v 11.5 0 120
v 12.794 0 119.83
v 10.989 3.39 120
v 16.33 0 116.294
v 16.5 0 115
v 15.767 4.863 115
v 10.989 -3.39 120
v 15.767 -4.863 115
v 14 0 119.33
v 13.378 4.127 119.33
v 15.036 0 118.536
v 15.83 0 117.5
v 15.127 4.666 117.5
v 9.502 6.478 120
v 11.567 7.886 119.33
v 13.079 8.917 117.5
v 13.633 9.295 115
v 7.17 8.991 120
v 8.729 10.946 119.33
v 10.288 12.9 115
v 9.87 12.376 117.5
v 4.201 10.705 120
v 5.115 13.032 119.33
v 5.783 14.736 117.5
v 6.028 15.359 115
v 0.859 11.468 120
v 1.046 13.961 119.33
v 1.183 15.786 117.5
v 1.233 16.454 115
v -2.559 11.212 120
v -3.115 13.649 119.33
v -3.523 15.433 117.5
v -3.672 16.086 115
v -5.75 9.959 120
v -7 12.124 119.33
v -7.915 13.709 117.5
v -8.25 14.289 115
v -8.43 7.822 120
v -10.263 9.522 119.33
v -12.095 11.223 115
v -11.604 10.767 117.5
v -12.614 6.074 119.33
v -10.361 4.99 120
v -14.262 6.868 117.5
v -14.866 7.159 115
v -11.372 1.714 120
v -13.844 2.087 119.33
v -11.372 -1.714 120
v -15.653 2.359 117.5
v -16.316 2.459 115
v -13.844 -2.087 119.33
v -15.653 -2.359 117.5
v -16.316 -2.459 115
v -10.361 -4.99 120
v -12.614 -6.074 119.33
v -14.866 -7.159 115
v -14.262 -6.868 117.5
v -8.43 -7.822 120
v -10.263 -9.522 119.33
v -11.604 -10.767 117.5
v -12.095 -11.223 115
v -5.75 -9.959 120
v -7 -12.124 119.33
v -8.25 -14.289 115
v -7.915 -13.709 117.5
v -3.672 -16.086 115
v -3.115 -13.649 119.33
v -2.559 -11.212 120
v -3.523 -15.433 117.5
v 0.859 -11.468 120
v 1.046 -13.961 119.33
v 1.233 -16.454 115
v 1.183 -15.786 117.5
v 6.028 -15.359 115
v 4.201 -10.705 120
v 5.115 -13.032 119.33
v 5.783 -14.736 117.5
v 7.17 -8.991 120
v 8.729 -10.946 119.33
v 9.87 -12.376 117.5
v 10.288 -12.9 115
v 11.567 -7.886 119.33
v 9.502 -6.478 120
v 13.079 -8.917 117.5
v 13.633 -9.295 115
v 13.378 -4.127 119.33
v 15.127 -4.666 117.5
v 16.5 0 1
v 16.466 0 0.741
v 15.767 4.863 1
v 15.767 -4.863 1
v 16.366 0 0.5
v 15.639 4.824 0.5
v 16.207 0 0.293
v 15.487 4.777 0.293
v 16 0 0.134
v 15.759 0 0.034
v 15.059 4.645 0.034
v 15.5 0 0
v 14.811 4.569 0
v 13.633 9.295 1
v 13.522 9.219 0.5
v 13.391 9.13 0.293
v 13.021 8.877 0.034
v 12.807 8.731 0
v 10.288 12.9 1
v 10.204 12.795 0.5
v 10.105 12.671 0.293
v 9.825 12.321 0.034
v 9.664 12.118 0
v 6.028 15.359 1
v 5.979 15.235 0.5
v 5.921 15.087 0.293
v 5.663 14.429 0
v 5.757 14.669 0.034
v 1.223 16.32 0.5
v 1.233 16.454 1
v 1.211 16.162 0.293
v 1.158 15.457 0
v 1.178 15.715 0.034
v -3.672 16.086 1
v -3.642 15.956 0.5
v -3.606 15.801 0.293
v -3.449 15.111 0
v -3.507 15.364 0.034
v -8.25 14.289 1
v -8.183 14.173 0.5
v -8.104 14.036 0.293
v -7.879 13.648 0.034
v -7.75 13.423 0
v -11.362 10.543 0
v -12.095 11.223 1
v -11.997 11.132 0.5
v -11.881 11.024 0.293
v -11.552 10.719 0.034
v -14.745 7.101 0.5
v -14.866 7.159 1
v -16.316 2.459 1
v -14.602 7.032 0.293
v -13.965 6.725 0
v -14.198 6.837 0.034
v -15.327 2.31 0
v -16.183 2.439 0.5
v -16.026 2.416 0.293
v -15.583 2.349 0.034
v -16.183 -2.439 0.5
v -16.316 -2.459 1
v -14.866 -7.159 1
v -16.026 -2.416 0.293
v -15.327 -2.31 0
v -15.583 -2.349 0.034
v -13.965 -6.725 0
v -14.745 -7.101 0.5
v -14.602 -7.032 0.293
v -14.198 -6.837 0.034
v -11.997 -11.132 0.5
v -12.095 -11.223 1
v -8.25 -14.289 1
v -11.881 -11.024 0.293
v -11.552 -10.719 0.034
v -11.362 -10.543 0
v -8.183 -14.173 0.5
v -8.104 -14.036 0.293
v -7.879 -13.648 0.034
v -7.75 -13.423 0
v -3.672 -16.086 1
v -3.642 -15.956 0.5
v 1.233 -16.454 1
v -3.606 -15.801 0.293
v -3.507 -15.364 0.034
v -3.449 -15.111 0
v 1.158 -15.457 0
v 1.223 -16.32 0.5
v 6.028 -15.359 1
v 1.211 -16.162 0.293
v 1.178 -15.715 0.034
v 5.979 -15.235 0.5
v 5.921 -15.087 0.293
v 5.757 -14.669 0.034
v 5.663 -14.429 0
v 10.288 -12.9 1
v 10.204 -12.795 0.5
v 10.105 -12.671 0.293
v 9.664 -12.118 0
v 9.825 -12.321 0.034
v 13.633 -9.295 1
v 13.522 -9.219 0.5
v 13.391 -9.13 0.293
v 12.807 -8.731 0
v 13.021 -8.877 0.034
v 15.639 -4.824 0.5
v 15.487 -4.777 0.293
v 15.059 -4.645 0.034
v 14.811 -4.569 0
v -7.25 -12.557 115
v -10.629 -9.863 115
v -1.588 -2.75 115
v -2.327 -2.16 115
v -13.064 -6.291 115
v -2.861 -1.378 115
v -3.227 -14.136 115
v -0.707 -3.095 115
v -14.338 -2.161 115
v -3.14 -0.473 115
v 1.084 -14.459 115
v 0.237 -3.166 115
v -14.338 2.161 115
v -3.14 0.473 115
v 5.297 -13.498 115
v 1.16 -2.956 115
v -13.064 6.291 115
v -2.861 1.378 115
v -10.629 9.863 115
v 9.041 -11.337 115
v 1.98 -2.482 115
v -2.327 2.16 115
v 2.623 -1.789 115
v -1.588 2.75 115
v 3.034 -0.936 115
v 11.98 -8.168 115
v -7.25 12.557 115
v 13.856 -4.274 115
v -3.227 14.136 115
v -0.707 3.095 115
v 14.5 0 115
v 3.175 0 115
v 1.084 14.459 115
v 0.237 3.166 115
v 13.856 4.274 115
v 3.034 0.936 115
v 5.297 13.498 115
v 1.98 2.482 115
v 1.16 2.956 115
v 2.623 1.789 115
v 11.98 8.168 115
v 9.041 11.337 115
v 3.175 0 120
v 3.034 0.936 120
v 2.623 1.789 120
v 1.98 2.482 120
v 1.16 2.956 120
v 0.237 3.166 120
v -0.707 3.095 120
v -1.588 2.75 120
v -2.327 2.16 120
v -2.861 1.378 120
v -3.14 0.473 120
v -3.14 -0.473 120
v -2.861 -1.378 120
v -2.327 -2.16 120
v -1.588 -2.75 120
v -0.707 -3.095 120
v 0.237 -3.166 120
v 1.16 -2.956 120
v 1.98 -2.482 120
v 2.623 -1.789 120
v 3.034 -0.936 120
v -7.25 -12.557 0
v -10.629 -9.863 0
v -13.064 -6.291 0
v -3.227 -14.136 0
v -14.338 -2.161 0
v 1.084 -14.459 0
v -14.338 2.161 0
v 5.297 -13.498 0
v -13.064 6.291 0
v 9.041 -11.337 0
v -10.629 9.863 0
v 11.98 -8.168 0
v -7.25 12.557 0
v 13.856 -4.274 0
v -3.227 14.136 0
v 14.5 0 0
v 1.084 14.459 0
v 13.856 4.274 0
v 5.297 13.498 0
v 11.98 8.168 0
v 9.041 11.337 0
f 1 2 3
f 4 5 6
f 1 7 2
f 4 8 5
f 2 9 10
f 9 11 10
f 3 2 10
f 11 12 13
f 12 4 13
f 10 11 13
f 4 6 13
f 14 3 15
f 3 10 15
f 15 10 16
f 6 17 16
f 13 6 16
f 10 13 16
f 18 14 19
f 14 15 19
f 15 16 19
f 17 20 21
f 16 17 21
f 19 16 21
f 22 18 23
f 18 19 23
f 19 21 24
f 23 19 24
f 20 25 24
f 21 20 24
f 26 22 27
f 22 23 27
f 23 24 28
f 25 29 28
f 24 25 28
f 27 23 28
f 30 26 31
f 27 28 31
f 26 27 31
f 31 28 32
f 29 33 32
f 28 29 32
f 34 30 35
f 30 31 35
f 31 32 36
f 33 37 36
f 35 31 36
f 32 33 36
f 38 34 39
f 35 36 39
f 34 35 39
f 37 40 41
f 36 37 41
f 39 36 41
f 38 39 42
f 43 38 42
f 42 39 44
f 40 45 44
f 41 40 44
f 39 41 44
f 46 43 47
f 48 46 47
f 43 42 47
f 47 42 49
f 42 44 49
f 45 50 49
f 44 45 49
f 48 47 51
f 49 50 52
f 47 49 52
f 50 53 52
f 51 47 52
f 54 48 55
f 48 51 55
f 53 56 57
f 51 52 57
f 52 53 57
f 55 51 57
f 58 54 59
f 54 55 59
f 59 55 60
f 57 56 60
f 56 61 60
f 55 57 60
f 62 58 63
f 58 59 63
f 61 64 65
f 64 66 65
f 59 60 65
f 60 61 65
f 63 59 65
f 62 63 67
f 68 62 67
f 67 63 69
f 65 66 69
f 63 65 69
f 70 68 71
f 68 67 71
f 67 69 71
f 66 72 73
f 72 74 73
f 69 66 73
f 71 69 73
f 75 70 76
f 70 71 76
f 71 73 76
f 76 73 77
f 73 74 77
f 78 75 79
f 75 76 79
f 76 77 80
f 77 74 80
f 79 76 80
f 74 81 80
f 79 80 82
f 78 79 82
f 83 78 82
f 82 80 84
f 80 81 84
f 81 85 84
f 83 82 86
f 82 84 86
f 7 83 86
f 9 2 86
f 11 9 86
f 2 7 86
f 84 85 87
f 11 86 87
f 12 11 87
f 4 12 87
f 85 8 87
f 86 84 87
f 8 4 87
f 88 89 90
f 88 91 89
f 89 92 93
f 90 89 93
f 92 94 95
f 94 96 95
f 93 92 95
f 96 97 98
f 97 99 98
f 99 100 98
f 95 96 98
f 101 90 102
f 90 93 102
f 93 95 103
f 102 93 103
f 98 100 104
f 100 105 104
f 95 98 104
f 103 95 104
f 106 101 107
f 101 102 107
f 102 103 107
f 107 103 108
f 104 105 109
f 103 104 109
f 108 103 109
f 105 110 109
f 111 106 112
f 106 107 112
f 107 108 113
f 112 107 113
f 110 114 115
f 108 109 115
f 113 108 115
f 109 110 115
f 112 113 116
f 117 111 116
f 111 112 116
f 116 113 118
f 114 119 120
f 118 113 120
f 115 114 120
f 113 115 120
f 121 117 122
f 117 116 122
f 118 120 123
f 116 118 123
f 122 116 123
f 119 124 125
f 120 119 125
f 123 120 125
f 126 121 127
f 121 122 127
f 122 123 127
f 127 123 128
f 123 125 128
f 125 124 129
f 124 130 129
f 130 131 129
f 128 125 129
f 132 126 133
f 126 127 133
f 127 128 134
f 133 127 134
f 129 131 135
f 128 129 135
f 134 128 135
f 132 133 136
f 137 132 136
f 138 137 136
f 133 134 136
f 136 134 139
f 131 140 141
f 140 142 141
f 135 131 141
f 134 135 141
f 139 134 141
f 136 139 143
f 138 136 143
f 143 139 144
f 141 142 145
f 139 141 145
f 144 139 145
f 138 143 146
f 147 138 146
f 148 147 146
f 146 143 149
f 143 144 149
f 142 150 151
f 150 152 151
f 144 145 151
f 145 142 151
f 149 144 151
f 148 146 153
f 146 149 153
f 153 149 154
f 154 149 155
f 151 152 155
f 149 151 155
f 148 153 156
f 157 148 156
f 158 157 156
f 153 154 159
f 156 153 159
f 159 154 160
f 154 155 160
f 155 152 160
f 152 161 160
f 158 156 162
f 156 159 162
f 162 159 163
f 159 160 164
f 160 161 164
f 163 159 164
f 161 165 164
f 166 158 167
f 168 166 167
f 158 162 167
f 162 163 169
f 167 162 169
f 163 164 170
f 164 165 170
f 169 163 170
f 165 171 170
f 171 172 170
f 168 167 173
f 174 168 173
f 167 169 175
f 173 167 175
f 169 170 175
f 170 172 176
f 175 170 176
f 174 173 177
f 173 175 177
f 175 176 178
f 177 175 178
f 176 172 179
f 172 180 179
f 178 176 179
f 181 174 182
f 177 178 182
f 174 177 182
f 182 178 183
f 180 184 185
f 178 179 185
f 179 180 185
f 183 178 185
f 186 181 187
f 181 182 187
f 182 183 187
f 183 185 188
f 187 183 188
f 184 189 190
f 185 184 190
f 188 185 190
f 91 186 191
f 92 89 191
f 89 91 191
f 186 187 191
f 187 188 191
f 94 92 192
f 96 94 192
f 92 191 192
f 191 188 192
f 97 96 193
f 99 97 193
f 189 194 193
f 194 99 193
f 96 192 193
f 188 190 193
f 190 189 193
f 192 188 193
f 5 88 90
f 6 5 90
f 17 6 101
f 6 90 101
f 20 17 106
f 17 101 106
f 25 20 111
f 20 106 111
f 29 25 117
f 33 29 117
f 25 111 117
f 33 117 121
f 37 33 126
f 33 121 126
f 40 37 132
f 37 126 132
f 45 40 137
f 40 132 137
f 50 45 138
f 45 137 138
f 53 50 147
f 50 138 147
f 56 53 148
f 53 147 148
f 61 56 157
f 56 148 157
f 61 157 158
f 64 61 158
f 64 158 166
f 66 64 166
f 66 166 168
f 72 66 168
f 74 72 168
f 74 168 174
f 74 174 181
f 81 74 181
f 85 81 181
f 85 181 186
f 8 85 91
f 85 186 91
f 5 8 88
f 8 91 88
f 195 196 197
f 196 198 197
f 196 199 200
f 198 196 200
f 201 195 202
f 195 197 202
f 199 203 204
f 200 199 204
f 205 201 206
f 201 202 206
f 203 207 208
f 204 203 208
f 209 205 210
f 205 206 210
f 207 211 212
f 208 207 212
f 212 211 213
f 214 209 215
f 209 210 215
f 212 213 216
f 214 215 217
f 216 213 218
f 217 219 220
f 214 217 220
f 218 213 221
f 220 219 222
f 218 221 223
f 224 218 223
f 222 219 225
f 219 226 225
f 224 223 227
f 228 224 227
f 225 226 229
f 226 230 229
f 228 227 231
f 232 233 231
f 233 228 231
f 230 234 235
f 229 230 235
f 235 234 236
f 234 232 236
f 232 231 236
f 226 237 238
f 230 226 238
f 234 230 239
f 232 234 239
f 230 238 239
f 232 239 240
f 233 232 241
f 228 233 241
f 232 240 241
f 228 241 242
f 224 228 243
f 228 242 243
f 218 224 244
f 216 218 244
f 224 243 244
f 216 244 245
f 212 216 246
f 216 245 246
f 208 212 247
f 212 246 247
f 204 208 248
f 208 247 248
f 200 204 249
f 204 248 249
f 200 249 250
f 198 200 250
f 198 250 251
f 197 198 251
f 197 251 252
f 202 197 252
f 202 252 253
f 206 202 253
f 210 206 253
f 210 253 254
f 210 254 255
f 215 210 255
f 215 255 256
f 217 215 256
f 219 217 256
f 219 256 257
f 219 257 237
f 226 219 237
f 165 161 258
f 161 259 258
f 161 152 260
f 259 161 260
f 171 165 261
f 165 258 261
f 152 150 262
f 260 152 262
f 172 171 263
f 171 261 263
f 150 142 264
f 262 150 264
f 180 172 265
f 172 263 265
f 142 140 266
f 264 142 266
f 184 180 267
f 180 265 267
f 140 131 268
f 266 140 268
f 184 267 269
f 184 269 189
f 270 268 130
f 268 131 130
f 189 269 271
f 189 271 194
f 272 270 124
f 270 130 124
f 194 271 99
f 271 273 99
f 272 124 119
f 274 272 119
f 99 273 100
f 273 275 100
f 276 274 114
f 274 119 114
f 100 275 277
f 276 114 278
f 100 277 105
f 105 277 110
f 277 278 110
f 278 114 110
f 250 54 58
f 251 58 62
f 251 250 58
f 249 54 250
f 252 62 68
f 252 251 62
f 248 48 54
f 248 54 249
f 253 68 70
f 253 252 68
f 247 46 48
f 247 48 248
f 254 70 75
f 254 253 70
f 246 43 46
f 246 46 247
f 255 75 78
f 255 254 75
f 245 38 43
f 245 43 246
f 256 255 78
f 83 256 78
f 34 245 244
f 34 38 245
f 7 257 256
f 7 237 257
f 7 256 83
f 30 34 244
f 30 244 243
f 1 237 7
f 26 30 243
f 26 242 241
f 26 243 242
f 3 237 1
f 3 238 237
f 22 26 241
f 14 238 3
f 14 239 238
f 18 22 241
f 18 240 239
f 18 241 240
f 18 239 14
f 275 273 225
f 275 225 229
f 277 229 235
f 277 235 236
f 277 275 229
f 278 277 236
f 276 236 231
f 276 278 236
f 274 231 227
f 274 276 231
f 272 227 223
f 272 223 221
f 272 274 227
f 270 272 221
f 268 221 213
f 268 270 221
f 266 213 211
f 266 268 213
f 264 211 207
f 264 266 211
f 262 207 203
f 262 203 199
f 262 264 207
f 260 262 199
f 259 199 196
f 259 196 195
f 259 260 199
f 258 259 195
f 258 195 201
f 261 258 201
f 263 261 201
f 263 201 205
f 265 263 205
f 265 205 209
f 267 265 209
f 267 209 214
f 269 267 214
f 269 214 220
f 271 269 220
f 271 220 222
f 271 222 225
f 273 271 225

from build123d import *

# Parameters (mm, degrees)
F0_R     = 16.5
F0_R_2   = 14.5
F1_DEPTH = 120
F2_R     = 14.5
F3_DEPTH = 5
F5_R     = 5
F6_R     = 1
F4_R     = 3.175
F7_DEPTH = 25


with BuildPart() as f1:
    # F0 (on Top) → F1 (new body)
    with BuildSketch(Plane.XY):
        Circle(F0_R)
        Circle(F0_R_2, mode=Mode.SUBTRACT)
    extrude(amount=F1_DEPTH)

    # F2 (on face) → F3 (join)
    with BuildSketch(Plane.XY.offset(120)):
        Circle(F2_R)
    extrude(amount=-F3_DEPTH)

    # F5
    f5_edges = [f1.edges().sort_by_distance(p)[0] for p in [
        (-16.5, 0, 120),
    ]]
    fillet(f5_edges, radius=F5_R)

    # F6
    f6_edges = [f1.edges().sort_by_distance(p)[0] for p in [
        (-16.5, 0, 0),
    ]]
    fillet(f6_edges, radius=F6_R)

    # F4 (on face) → F7 (cut)
    with BuildSketch(Plane.XY.offset(120)):
        Circle(F4_R)
    extrude(amount=-F7_DEPTH, mode=Mode.SUBTRACT)


solid = f1.part
